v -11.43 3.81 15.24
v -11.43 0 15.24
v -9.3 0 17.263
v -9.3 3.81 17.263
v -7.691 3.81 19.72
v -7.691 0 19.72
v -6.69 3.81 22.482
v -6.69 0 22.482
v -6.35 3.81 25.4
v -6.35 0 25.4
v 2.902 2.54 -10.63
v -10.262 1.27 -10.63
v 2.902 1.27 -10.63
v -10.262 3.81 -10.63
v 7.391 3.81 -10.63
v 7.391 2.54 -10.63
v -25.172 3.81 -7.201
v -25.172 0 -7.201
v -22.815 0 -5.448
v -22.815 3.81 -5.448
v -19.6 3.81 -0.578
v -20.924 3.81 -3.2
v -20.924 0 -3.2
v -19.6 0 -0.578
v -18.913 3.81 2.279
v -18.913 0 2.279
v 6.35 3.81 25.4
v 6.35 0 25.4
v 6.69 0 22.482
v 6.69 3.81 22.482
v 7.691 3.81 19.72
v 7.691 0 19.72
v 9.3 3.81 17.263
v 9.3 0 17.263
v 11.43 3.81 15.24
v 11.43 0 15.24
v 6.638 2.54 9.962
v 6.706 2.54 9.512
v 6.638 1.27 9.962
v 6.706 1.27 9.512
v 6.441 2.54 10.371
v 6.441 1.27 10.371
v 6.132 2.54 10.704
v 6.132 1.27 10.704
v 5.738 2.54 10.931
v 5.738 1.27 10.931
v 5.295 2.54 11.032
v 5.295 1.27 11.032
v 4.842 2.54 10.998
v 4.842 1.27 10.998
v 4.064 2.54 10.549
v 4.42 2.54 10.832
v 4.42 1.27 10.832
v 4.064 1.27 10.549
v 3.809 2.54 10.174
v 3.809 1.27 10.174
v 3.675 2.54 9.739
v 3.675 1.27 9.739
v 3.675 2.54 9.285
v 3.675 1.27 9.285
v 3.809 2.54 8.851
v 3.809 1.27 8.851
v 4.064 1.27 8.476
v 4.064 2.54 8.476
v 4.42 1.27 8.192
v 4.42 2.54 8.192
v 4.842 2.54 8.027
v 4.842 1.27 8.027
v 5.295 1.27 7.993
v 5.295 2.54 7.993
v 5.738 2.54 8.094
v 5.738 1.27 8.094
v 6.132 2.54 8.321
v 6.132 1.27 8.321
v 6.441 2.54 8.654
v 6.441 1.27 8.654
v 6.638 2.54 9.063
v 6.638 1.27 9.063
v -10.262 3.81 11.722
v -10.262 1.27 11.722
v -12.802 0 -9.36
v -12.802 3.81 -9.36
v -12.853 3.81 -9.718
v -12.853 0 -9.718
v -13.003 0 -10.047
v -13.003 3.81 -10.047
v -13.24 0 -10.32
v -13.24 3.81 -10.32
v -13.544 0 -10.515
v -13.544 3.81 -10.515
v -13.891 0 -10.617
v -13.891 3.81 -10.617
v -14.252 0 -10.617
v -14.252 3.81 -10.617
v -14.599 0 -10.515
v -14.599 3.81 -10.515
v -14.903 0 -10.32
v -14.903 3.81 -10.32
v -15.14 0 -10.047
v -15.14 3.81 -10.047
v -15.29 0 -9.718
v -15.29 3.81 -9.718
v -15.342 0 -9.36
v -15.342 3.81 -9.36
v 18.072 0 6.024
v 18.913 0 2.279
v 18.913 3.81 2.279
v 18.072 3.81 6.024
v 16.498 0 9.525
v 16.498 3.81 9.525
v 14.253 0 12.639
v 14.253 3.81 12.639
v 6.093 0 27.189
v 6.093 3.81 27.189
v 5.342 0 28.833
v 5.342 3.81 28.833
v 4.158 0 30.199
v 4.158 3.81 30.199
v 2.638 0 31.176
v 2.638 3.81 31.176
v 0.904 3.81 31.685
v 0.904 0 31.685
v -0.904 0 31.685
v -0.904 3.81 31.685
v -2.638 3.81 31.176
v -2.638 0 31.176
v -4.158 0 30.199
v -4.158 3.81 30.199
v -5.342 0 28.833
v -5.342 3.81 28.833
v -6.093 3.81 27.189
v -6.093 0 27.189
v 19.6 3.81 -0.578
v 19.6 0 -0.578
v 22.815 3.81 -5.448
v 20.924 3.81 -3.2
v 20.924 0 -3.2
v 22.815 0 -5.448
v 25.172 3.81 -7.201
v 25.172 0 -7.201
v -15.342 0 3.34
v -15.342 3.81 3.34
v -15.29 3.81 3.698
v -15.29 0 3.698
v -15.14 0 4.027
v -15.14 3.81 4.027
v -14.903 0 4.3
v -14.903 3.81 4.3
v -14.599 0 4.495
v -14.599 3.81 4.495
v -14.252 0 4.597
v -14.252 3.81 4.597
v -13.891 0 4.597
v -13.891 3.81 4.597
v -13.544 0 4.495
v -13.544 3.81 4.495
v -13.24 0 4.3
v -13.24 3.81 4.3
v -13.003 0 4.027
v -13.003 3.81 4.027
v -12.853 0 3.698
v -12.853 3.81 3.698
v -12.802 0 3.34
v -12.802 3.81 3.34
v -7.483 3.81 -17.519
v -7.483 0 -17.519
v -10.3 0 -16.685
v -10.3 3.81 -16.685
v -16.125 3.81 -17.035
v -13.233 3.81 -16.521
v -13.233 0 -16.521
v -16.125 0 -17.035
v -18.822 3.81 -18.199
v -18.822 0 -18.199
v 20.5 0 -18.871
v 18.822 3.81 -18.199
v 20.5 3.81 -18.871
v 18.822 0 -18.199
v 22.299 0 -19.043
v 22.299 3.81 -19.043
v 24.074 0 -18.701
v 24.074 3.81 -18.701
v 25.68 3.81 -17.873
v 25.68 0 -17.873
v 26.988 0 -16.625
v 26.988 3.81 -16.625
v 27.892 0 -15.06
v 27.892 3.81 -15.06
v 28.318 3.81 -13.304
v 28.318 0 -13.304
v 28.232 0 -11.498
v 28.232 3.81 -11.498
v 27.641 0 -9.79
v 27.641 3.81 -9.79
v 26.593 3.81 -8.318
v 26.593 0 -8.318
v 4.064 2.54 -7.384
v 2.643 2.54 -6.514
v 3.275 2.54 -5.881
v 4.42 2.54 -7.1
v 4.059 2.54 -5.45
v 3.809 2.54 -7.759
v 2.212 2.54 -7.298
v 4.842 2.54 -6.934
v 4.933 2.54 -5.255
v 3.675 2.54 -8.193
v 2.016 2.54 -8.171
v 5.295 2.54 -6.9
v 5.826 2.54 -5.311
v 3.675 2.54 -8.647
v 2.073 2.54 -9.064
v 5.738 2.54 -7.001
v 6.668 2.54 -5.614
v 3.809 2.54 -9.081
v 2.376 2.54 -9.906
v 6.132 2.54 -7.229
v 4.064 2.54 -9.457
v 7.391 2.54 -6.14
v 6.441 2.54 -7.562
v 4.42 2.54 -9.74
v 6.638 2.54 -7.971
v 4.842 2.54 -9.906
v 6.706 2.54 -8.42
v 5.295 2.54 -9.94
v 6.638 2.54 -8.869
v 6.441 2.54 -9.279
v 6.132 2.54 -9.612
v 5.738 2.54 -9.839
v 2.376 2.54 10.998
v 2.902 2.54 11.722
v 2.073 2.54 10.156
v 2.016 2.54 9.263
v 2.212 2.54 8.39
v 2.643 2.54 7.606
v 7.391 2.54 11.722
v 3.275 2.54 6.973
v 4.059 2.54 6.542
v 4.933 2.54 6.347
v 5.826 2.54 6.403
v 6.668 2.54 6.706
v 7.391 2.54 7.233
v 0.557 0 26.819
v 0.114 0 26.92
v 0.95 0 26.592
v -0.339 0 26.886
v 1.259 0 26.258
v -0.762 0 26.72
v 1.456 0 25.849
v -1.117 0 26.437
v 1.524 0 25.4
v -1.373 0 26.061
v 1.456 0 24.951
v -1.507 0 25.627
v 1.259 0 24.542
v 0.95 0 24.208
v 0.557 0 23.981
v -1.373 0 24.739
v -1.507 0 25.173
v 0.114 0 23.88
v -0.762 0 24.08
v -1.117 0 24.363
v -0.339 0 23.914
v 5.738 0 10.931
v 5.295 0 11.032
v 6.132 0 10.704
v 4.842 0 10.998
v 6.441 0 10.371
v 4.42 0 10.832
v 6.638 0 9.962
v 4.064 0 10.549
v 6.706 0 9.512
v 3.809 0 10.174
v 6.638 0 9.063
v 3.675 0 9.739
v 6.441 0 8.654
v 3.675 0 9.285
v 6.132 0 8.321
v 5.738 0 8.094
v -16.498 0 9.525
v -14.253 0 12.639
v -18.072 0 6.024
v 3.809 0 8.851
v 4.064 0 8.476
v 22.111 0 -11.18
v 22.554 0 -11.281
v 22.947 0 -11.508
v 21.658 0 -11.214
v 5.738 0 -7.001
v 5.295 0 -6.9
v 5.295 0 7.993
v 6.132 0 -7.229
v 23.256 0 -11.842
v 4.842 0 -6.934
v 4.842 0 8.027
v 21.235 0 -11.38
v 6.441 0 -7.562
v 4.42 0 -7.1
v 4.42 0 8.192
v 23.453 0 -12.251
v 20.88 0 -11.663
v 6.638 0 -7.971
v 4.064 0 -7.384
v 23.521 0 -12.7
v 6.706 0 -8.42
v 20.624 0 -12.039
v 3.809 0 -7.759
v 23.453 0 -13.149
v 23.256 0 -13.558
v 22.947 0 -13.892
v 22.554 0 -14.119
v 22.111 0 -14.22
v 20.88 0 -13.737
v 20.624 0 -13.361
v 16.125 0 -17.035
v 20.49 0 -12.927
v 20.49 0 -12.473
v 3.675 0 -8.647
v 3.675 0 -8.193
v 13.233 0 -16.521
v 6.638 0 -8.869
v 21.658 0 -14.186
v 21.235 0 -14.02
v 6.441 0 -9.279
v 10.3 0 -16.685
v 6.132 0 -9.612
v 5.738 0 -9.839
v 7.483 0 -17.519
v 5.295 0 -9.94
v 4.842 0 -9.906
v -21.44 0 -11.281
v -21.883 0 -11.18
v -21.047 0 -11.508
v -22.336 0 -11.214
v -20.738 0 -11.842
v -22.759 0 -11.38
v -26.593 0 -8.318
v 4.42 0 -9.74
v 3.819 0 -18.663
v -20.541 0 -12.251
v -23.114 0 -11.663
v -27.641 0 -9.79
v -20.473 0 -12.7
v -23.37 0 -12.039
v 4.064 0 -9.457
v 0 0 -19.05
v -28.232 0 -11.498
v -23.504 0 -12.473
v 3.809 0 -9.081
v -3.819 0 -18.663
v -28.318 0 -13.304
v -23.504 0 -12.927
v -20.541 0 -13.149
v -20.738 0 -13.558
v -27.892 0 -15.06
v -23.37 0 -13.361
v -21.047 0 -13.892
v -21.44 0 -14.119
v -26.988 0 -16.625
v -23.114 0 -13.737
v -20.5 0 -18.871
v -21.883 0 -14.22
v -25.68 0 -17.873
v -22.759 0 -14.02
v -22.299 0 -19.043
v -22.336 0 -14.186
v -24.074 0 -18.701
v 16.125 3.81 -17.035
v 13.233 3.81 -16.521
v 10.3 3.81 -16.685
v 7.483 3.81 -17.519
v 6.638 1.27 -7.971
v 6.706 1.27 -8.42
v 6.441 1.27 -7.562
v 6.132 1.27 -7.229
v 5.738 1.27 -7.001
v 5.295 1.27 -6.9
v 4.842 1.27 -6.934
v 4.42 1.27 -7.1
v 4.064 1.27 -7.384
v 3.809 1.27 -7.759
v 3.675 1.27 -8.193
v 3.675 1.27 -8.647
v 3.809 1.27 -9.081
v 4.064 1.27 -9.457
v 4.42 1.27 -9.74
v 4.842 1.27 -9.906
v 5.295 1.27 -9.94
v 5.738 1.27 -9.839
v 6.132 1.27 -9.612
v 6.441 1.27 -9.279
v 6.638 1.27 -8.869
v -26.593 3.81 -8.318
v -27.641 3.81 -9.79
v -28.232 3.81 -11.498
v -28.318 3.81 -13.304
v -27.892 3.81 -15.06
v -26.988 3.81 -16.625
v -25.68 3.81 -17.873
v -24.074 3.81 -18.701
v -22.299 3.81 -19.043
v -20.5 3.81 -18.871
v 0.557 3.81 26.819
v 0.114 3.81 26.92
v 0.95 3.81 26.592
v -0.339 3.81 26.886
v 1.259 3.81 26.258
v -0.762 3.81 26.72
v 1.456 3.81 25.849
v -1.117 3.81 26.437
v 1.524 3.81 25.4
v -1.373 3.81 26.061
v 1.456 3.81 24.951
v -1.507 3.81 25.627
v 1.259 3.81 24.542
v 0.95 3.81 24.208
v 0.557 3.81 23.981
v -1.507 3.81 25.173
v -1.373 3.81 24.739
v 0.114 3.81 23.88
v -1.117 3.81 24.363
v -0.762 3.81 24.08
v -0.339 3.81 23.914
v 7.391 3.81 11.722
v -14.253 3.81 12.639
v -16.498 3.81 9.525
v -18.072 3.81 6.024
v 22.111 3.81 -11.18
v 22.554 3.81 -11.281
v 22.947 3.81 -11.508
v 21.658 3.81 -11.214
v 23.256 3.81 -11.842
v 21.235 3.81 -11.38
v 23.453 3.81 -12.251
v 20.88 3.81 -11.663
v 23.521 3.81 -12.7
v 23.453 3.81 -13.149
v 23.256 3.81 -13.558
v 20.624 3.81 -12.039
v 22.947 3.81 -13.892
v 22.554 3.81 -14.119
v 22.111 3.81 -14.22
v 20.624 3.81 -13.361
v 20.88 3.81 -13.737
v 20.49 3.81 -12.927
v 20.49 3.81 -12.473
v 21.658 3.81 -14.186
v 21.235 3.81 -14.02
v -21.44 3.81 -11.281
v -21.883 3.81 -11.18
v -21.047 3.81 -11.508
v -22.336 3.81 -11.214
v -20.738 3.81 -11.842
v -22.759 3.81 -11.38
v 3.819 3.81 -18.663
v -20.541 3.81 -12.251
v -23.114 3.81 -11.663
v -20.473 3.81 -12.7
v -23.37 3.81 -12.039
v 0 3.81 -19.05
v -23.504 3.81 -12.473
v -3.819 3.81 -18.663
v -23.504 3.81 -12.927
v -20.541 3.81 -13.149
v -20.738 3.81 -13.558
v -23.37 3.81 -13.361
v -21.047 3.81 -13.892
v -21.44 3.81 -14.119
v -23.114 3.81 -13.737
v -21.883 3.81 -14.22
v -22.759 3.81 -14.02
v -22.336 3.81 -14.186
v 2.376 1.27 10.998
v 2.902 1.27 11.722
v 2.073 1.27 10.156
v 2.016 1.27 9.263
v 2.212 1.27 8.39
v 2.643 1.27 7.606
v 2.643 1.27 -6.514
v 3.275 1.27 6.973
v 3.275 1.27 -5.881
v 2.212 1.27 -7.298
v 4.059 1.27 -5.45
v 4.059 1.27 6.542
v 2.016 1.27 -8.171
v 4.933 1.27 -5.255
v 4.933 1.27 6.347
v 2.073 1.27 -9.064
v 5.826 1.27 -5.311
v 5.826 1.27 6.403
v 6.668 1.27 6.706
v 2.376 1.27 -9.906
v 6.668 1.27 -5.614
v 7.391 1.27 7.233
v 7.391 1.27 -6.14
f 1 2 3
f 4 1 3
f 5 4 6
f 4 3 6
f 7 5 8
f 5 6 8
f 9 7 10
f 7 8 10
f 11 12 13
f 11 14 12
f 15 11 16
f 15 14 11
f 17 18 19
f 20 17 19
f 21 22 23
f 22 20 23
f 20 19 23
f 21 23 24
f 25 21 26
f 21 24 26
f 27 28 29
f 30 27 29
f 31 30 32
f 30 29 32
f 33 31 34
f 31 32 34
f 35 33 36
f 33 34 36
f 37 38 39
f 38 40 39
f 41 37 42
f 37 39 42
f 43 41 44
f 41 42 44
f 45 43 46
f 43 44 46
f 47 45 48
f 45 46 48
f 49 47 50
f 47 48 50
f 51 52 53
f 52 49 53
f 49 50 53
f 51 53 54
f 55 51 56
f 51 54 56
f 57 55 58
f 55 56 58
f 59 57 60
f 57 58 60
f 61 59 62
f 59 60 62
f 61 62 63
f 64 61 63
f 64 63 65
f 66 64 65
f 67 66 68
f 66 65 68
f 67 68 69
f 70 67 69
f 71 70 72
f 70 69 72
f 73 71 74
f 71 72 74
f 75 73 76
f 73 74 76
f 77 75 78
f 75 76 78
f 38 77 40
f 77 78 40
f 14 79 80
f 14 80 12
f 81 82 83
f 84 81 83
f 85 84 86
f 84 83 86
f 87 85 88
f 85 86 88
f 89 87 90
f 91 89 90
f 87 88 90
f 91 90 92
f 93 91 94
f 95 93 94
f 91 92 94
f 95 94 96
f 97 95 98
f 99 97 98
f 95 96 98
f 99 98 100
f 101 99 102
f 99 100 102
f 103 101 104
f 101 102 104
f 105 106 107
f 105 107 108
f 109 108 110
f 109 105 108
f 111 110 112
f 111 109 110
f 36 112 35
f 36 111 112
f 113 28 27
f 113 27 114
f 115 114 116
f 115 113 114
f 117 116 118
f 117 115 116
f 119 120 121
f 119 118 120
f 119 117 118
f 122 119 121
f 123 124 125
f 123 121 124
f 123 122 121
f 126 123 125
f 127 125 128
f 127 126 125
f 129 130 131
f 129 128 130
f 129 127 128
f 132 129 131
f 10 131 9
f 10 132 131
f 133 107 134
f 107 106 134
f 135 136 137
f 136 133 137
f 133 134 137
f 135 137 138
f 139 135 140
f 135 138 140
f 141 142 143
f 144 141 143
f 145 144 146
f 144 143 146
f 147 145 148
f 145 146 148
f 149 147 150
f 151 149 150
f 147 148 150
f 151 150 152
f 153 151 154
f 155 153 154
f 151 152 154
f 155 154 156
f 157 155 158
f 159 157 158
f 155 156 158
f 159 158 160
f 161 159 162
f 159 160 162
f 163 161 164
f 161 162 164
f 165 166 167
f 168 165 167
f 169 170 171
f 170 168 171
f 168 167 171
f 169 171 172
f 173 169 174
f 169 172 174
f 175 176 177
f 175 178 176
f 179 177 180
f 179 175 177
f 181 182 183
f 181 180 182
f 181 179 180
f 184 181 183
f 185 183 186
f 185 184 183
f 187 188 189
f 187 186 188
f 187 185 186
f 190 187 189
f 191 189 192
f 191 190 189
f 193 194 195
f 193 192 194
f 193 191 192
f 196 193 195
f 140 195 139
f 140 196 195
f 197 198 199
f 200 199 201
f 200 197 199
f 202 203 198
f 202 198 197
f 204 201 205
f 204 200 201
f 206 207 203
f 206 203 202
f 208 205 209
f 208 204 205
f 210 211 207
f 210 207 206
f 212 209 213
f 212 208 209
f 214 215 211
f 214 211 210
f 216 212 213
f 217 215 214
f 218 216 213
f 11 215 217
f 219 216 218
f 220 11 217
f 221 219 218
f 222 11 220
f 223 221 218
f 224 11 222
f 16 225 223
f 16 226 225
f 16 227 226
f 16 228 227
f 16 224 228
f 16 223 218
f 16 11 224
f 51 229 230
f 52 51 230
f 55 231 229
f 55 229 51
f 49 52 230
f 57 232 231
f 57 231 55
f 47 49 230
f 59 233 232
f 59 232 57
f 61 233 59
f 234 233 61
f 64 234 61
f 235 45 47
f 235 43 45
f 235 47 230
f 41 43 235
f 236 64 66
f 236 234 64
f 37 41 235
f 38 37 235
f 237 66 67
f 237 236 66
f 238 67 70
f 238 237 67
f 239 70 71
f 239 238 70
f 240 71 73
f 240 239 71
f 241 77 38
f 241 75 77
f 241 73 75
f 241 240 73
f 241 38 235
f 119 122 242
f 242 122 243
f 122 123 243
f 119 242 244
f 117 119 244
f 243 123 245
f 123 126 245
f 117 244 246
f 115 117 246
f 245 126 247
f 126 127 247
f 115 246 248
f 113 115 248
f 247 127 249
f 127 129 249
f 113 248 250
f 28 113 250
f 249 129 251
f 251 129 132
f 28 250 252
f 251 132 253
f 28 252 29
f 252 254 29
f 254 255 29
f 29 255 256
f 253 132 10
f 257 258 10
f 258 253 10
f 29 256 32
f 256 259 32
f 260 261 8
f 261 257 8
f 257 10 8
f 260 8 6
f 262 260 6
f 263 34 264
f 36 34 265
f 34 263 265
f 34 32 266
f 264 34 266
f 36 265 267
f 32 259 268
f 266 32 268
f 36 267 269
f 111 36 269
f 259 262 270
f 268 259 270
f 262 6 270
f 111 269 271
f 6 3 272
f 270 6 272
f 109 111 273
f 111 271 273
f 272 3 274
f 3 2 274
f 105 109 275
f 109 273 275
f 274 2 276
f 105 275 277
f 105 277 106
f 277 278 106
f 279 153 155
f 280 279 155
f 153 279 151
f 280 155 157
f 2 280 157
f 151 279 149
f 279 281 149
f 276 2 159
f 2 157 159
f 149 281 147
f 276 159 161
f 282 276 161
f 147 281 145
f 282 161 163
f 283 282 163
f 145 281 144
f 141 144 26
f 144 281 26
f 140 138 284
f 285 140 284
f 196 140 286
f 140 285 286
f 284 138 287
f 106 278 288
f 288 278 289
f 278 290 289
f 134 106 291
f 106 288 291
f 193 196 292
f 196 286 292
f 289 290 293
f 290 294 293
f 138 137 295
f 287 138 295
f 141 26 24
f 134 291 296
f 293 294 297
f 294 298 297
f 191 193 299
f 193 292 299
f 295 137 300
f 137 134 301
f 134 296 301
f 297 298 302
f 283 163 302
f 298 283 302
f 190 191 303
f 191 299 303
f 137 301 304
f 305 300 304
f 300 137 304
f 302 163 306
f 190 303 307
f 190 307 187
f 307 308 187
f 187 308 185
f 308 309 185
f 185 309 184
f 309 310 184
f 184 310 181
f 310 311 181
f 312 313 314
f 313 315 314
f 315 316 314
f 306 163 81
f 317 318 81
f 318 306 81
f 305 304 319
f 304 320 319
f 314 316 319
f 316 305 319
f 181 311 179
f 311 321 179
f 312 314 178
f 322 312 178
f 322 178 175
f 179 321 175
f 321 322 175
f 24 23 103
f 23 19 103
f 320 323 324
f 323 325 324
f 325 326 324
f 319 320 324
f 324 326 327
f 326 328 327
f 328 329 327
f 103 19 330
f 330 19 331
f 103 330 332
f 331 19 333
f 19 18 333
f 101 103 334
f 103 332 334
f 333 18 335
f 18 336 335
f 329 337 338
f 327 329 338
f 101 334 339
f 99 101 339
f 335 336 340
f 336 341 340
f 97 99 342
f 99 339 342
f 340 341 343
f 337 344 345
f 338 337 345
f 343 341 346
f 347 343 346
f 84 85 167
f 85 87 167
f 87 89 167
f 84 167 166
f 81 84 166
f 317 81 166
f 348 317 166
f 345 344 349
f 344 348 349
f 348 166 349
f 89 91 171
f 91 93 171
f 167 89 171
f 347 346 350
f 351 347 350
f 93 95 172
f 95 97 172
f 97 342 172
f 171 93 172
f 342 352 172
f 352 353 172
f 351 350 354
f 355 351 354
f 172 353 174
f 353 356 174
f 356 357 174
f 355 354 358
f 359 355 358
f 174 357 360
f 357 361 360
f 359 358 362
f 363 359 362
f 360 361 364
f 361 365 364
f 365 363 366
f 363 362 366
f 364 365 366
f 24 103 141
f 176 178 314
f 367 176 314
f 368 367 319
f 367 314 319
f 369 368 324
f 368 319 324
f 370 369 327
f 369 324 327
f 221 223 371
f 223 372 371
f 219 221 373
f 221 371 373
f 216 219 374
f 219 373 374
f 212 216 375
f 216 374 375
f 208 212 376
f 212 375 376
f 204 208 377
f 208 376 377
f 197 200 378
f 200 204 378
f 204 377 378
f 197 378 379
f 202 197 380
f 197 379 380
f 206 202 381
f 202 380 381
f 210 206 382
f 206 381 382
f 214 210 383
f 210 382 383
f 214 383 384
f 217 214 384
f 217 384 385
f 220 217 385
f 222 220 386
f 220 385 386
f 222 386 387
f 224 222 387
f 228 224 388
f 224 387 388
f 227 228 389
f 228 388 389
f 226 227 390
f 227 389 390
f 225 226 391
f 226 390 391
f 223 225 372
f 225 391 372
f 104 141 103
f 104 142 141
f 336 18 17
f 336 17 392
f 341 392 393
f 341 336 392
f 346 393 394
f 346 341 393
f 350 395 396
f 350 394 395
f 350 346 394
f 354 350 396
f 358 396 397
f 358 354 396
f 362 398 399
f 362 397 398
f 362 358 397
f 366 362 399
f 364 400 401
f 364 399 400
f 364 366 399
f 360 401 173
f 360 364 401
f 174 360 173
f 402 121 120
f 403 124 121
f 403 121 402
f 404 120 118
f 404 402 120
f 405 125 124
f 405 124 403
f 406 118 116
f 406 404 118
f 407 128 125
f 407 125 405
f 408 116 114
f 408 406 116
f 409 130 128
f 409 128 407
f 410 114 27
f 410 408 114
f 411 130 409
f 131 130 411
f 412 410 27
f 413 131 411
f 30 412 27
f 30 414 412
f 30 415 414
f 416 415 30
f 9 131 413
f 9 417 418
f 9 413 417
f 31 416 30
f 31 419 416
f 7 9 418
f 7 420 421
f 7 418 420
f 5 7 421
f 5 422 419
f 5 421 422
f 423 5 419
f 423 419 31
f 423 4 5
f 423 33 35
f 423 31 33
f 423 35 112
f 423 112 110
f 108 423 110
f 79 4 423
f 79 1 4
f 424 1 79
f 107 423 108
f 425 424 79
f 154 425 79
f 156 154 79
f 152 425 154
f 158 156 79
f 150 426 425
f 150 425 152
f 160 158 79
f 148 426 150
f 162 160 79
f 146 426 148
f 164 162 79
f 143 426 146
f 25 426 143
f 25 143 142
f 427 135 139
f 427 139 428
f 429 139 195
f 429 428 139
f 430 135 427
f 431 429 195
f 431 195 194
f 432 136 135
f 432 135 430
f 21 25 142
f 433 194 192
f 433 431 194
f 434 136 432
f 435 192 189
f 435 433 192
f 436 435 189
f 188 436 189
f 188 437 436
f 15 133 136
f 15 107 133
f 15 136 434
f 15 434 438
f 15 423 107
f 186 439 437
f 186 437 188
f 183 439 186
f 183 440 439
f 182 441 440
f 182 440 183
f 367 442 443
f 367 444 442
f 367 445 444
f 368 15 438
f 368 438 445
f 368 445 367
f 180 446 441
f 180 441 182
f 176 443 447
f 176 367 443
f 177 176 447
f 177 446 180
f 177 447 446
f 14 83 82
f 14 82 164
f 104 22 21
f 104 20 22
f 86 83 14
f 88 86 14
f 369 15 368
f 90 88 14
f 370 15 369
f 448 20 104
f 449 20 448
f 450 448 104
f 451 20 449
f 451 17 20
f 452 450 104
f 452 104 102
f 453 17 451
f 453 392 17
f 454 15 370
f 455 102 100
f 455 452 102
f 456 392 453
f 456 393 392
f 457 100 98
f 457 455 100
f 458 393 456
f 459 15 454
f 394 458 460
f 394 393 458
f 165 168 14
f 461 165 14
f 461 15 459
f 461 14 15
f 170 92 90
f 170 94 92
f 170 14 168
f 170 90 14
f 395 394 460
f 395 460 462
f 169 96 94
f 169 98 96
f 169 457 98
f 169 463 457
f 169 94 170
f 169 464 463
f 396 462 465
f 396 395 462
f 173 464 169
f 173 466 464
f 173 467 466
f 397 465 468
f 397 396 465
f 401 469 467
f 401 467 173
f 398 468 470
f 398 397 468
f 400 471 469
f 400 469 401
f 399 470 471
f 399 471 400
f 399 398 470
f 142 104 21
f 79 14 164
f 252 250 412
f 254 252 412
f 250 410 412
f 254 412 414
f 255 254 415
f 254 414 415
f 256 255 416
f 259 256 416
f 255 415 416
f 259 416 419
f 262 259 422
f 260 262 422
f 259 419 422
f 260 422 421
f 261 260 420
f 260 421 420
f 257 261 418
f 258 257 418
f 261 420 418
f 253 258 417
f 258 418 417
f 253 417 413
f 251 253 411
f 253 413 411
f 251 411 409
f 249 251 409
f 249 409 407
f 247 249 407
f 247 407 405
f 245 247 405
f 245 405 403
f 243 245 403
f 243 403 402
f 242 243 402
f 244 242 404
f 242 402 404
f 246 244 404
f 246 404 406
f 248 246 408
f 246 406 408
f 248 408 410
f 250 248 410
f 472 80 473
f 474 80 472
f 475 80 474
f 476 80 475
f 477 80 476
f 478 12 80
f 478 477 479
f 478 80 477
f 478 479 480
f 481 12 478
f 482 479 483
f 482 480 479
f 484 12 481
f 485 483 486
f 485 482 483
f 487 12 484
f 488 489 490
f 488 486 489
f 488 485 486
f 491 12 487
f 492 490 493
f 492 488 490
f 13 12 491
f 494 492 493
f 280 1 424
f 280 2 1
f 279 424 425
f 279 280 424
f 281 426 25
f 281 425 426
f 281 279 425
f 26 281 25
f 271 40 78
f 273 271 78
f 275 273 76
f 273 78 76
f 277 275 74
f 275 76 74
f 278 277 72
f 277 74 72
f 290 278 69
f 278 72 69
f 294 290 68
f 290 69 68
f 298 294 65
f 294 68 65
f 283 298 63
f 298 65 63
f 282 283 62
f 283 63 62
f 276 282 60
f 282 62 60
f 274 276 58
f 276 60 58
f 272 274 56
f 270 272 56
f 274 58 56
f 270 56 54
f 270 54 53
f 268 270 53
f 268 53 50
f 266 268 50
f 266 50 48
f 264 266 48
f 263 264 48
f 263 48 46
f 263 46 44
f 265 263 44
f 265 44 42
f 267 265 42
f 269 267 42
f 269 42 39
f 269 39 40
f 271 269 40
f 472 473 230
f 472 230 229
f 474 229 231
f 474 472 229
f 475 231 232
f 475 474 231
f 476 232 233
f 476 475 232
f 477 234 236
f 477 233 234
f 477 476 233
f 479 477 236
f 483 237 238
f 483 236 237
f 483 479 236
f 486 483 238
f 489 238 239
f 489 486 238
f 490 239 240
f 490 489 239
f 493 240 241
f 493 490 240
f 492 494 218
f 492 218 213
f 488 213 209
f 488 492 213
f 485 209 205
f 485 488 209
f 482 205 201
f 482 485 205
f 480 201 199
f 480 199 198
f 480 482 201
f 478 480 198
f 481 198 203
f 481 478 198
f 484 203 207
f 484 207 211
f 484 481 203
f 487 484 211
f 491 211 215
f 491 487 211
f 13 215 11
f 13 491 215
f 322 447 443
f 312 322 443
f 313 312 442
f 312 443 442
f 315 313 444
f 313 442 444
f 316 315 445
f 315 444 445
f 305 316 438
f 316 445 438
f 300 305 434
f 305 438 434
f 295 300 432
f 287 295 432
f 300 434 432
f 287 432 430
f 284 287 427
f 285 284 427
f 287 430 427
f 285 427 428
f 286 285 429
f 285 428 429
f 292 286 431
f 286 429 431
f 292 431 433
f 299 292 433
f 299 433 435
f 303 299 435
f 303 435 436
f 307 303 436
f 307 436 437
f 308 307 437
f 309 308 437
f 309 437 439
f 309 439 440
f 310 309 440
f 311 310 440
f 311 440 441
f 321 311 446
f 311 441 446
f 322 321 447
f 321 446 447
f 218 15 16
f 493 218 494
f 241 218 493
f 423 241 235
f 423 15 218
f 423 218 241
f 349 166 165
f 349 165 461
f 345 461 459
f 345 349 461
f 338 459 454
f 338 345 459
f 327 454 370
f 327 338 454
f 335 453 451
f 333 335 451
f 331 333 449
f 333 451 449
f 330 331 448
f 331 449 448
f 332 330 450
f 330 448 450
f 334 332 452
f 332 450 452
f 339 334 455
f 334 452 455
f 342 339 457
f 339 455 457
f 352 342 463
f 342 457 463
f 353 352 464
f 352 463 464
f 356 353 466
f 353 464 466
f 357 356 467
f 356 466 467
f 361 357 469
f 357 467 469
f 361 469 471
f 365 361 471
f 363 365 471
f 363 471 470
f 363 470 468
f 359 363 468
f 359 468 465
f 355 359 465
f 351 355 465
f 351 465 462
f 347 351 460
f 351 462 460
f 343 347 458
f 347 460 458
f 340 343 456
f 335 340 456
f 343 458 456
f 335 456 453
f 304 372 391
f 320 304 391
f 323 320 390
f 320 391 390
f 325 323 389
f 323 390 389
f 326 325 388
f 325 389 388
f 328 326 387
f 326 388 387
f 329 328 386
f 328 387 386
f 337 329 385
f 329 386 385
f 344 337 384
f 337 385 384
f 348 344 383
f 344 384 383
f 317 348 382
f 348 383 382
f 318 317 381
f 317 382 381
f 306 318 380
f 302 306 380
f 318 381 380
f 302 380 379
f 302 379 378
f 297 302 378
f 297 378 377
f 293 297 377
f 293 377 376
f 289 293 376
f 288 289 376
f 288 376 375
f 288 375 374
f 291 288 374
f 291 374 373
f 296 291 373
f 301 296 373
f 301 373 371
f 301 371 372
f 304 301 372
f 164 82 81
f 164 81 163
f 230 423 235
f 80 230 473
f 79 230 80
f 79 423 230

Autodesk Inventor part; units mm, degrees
ref_plane "YZ Plane" through (0, 0, 0) normal (1, 0, 0) x (0, 1, 0)
ref_plane "XZ Plane" through (0, 0, 0) normal (0, 1, 0) x (-1, 0, 0)
ref_plane "XY Plane" through (0, 0, 0) normal (0, 0, 1) x (1, 0, 0)
sketch "Sketch1" plane through (0, 0, 0) normal (0, 1, 0) x (-1, 0, 0)
  arc A0 (6.35, 25.4) -> (-6.35, 25.4) centre (0, 25.4) ccw
  arc A1 (-11.43, 15.24) -> (11.43, 15.24) centre (0, 0) ccw
  arc A2 (-11.43, 15.24) -> (-6.35, 25.4) centre (-19.05, 25.4) ccw
  arc A3 (6.35, 25.4) -> (11.43, 15.24) centre (19.05, 25.4) ccw
  dimension "d0" = 25.4
  dimension "d1" = 38.1
  dimension "d2" = 12.7
extrude "Extrusion1" add sketch "Sketch1" along normal blind 3.81
sketch "Sketch2" plane through (0, 3.81, 0) normal (0, 1, 0) x (1, 0, 0)
  arc A0 (-6.35, -25.4) -> (6.35, -25.4) centre (0, -25.4) ccw projected
  circle A1 centre (0, -25.4) radius 1.524
  dimension "d5" = 3.048
extrude "Extrusion2" cut sketch "Sketch2" against normal through all
pattern_circular "Circular Pattern1" count 3 over 360 about axis through (0, 0, 0) along (0, 1, 0) of "Extrusion2", "Extrusion1"
sketch "Sketch3" plane through (0, 3.81, 0) normal (0, 1, 0) x (1, 0, 0)
  arc A0 (11.43, -15.24) -> (18.9132, -2.2787) centre (0, 0) ccw projected
  line L0 (-10.2616, 10.6299) -> (7.3914, 10.6299)
  line L1 (7.3914, 10.6299) -> (7.3914, -11.7221)
  line L2 (7.3914, -11.7221) -> (-10.2616, -11.7221)
  line L3 (-10.2616, -11.7221) -> (-10.2616, 10.6299)
  dimension "d11" = 22.352
  dimension "d12" = 17.653
  dimension "d14" = 10.6299
  dimension "d29" = 7.3914
extrude "Extrusion3" cut sketch "Sketch3" against normal blind 2.54
sketch "Sketch4" plane through (0, 1.27, 0) normal (0, 1, 0) x (1, 0, 0)
  line L0 (-10.2616, 10.6299) -> (7.3914, 10.6299) projected
  line L1 (7.3914, -11.7221) -> (-10.2616, -11.7221) projected
  line L2 (7.3914, 10.6299) -> (7.3914, -11.7221) projected
  circle A0 centre (5.1816, 8.4201) radius 1.524
  circle A1 centre (5.1816, -9.5123) radius 1.524
  point P0 (0, 0)
  dimension "d17" = 3.048
  dimension "d18" = 2.2098
  dimension "d19" = 2.2098
  dimension "d20" = 2.2098
extrude "Extrusion4" cut sketch "Sketch4" against normal through all
sketch "Sketch5" plane through (0, 1.27, 0) normal (0, 1, 0) x (1, 0, 0)
  circle A0 centre (5.1816, 8.4201) radius 1.524 projected
  circle A1 centre (5.1816, -9.5123) radius 1.524 projected
  line L0 (-10.2616, 10.6299) -> (7.3914, 10.6299) projected
  circle A2 centre (5.1816, 8.4201) radius 3.175
  circle A3 centre (5.1816, -9.5123) radius 3.175
  point P0 (0, 0)
  dimension "d31" = 6.35
extrude "Extrusion5" add sketch "Sketch5" along normal blind 1.27
sketch "Sketch6" plane through (0, 3.81, 0) normal (0, 1, 0) x (1, 0, 0)
  line L0 (-10.2616, -11.7221) -> (-10.2616, 10.6299) projected
  line L1 (-10.2616, 10.6299) -> (7.3914, 10.6299) projected
  line L2 (-12.8016, 9.3599) -> (-12.8016, -3.3401)
  line L3 (-15.3416, -3.3401) -> (-15.3416, 9.3599)
  arc A0 (-12.8016, 9.3599) -> (-15.3416, 9.3599) centre (-14.0716, 9.3599) ccw
  arc A1 (-15.3416, -3.3401) -> (-12.8016, -3.3401) centre (-14.0716, -3.3401) ccw
  point P0 (-12.8016, -11.7221)
  dimension "d25" = 2.54
  dimension "d26" = 2.54
  dimension "d30" = 12.7
extrude "Extrusion6" cut sketch "Sketch6" against normal through all
equation "\"d19\" = d18"
equation "\"d20\" = d18"
properties part number "Gyro Mount"
